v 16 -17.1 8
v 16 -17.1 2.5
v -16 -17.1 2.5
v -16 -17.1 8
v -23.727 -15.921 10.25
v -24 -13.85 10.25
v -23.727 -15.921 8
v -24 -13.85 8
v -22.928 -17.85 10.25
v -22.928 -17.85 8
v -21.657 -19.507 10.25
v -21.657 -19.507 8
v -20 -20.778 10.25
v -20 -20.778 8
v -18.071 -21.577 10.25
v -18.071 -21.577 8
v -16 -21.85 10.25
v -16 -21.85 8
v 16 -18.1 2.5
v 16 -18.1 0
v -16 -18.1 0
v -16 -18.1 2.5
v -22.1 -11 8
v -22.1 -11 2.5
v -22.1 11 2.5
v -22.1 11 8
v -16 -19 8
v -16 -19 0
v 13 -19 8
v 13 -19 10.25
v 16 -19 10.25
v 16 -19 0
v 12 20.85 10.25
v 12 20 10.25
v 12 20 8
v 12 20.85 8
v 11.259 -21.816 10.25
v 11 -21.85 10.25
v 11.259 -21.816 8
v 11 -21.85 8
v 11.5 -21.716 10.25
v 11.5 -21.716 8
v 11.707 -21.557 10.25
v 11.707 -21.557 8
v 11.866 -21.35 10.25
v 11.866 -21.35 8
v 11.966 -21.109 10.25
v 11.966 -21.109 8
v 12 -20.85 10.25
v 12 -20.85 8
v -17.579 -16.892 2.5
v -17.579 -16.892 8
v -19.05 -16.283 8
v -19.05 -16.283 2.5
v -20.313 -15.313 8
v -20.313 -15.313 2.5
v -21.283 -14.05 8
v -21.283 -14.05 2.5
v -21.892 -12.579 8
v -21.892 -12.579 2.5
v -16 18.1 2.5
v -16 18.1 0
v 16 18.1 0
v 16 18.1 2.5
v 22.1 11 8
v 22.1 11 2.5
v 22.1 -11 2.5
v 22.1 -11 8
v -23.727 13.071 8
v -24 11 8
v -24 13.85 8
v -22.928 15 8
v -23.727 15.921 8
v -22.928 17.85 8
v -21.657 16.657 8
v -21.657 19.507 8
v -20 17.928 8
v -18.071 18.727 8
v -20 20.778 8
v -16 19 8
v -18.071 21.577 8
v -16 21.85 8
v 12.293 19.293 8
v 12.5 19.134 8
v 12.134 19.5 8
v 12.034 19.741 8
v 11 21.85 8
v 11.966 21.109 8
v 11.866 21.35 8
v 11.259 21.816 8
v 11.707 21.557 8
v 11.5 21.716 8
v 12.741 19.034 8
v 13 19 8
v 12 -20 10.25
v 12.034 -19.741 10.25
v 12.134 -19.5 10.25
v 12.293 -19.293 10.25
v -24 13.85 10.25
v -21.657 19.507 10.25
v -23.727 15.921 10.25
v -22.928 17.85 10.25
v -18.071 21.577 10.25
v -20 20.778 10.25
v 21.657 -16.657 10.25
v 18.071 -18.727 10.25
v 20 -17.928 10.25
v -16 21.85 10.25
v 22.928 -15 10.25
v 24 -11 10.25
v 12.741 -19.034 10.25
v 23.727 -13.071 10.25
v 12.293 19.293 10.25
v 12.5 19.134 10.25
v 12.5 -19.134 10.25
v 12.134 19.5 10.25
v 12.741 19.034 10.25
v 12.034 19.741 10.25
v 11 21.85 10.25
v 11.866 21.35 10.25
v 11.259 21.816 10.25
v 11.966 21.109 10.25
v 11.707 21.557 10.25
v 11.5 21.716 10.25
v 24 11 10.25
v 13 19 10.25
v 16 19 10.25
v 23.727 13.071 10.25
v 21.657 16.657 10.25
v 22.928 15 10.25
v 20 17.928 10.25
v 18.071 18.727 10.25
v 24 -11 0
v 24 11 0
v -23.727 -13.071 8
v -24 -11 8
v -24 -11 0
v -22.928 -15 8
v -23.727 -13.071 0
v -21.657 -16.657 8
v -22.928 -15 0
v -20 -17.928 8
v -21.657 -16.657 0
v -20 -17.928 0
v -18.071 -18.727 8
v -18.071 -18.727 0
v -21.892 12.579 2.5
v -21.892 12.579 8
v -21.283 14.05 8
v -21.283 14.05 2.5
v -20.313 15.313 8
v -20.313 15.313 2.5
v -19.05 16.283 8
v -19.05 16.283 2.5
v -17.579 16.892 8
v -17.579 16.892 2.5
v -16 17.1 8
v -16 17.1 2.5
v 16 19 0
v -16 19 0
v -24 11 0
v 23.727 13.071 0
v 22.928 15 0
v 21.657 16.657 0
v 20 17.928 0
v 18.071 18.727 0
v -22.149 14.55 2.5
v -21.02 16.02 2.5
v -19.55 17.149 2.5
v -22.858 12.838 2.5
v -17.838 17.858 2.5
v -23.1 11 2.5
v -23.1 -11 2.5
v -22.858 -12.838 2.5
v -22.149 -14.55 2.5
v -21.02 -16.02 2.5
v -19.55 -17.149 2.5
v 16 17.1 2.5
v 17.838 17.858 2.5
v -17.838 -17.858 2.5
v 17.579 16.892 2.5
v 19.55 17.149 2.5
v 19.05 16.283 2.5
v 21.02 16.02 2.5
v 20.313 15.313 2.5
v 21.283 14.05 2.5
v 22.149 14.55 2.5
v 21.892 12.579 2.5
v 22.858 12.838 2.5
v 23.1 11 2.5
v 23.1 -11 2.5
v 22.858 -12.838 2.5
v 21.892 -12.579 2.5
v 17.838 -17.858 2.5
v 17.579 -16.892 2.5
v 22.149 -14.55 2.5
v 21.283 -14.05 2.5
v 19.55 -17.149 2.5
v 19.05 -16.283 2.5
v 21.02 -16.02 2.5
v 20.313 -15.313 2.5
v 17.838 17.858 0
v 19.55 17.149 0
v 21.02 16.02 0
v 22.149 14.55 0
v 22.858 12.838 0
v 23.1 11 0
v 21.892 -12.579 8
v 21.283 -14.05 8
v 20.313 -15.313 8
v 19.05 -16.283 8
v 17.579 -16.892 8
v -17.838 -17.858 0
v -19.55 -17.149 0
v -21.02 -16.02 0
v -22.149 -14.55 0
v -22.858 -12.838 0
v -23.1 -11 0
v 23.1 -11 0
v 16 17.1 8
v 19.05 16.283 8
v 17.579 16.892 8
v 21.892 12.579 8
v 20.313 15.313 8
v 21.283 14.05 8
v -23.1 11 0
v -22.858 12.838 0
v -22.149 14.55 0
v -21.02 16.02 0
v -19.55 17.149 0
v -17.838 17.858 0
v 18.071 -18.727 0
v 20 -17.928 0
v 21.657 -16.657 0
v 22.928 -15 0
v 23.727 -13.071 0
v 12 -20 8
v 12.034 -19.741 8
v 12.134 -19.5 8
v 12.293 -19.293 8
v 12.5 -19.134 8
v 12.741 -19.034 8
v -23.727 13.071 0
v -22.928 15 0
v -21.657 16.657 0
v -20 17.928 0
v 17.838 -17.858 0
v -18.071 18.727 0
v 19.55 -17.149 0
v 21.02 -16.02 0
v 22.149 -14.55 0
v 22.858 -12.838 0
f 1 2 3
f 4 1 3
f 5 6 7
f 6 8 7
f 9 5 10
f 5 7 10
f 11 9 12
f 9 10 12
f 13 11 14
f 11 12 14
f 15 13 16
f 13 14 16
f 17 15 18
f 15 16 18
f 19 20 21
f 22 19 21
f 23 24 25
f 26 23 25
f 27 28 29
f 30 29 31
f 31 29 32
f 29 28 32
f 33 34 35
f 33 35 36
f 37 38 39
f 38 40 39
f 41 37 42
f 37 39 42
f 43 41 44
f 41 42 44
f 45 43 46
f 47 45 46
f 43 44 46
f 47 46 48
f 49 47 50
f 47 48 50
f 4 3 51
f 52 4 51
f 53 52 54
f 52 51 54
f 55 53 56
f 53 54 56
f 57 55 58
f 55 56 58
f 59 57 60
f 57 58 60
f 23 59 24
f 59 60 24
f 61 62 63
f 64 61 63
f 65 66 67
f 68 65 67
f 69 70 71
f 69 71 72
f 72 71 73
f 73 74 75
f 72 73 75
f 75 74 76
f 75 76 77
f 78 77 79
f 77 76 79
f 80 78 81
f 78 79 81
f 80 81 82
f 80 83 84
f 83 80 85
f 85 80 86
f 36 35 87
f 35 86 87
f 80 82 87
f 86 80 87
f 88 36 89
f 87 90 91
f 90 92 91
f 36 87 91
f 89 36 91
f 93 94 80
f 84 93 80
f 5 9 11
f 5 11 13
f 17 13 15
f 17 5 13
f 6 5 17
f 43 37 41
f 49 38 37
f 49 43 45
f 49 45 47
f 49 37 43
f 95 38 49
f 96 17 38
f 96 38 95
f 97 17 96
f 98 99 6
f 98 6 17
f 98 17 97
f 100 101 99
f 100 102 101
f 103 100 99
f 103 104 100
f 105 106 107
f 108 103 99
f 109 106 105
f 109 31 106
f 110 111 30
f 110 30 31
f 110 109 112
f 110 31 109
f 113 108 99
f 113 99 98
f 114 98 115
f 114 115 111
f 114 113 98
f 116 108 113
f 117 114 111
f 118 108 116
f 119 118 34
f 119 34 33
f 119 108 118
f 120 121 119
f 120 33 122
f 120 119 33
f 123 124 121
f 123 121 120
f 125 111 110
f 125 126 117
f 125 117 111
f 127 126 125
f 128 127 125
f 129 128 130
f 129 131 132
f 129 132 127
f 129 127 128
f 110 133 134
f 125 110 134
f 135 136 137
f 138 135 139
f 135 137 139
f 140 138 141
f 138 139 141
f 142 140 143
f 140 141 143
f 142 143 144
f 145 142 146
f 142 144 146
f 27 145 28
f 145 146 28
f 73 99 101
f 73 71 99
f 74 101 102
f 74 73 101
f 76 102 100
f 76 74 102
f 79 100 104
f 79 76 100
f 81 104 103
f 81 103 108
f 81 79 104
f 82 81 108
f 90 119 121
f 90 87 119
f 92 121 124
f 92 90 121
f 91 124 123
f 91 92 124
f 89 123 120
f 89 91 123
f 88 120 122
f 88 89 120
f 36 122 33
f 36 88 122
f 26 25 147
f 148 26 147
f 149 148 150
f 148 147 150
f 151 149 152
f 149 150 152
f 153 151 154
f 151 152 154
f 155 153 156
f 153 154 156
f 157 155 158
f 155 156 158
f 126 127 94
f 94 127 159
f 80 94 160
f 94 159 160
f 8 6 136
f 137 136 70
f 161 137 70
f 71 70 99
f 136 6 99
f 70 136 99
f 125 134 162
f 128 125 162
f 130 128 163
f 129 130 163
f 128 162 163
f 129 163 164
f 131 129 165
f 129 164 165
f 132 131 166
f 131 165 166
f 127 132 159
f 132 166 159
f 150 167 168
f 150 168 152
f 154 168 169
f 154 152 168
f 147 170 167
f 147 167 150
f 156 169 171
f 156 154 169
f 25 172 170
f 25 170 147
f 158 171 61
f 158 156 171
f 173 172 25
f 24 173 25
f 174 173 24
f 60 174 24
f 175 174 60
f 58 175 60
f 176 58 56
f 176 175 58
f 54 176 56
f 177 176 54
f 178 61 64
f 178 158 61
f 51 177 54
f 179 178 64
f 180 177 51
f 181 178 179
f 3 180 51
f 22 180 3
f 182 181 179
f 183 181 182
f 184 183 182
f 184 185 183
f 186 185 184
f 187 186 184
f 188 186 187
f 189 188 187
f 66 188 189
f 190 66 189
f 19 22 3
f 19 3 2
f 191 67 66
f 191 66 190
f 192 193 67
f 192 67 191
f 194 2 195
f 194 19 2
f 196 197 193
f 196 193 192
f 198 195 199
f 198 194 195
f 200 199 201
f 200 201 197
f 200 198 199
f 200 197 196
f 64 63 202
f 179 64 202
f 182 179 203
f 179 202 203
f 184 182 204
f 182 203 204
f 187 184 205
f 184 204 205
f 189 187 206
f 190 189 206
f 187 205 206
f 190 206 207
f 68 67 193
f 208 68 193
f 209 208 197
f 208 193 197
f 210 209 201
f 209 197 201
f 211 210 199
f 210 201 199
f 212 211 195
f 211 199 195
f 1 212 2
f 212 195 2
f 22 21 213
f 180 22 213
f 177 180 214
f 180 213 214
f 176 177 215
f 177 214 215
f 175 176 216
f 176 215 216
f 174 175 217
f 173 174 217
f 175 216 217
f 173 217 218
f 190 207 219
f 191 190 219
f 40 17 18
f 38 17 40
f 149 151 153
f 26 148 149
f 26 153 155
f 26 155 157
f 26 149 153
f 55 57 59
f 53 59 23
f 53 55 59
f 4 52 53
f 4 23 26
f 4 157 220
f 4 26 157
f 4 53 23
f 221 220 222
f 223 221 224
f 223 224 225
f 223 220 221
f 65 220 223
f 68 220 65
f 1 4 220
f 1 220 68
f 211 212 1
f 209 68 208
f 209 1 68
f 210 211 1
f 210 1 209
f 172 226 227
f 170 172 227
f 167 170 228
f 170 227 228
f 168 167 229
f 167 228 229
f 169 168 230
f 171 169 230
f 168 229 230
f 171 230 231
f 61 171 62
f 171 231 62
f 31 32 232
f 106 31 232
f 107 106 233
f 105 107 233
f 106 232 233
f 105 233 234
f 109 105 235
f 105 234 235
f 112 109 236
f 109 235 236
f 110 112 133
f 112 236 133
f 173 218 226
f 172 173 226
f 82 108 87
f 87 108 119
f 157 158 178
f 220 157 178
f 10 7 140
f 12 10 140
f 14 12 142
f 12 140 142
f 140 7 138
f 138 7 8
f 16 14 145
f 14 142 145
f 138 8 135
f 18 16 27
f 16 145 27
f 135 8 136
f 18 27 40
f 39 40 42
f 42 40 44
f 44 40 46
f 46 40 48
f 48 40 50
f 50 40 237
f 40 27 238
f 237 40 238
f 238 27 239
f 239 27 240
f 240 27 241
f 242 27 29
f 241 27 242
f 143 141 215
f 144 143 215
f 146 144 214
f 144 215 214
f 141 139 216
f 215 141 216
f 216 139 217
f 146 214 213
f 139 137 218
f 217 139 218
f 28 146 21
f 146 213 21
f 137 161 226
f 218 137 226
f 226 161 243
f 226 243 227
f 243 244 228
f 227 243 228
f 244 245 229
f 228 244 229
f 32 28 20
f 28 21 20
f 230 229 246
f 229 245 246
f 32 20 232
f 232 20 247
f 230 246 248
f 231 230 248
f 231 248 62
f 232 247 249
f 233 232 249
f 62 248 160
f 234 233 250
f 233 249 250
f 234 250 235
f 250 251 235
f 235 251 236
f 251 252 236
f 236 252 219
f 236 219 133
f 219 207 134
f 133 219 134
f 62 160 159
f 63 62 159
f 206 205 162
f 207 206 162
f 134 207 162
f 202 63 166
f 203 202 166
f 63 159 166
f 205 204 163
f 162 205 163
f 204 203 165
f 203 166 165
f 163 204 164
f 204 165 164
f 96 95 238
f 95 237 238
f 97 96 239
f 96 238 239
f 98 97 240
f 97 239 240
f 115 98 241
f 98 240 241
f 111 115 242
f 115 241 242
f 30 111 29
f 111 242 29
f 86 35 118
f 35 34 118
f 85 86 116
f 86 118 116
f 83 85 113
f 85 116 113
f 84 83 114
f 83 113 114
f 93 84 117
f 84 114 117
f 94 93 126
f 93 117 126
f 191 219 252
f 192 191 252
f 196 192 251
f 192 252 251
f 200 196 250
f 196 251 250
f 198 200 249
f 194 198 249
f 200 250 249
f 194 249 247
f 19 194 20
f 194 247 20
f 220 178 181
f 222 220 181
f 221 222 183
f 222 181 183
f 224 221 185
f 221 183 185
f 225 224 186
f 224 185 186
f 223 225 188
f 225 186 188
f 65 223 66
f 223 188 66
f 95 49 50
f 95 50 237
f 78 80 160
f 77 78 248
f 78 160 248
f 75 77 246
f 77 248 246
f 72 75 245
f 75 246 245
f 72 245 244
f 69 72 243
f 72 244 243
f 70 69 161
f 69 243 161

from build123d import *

# Parameters (mm, degrees)
F1_DEPTH = 10.25
F2_W     = 36
F2_H     = 43.7
F3_DEPTH = 2.25
F4_R     = 8
F5_R     = 1
F6_R     = 1
F8_DEPTH = 8
F9_DEPTH = 2.5


with BuildPart() as f1:
    # F0 (on Top) → F1 (new body)
    with BuildSketch(Plane.XY):
        with BuildLine():
            Line((16, 19), (-16, 19))
            ThreePointArc((-16, 19), (-21.6568542495, 16.6568542495), (-24, 11))
            Line((-24, 11), (-24, -11))
            ThreePointArc((-24, -11), (-21.6568542495, -16.6568542495), (-16, -19))
            Line((-16, -19), (16, -19))
            ThreePointArc((16, -19), (21.6568542495, -16.6568542495), (24, -11))
            Line((24, -11), (24, 11))
            ThreePointArc((24, 11), (21.6568542495, 16.6568542495), (16, 19))
        make_face()
    extrude(amount=F1_DEPTH)

    # F2 (on face) → F3 (join)
    with BuildSketch(Plane.XY.offset(10.25)):
        with Locations((-6, 0)):
            Rectangle(F2_W, F2_H)
    extrude(amount=-F3_DEPTH)

    # F4
    f4_edges = [f1.edges().sort_by_distance(p)[0] for p in [
        (-24, -21.85, 9.125),
        (-24, 21.85, 9.125),
    ]]
    fillet(f4_edges, radius=F4_R)

    # F5
    f5_edges = [f1.edges().sort_by_distance(p)[0] for p in [
        (12, -21.85, 9.125),
        (12, 21.85, 9.125),
    ]]
    fillet(f5_edges, radius=F5_R)

    # F6
    f6_edges = [f1.edges().sort_by_distance(p)[0] for p in [
        (12, 19, 9.125),
        (12, -19, 9.125),
    ]]
    fillet(f6_edges, radius=F6_R)

    # F7 (on face) → F8 (cut)
    with BuildSketch(Plane(origin=(0, 0, 0), x_dir=(1, 0, 0), z_dir=(0, 0, -1))):
        with BuildLine():
            ThreePointArc((22.1, 11), (20.3133513652, 15.3133513652), (16, 17.1))
            Line((16, 17.1), (-16, 17.1))
            ThreePointArc((-16, 17.1), (-20.3133513652, 15.3133513652), (-22.1, 11))
            Line((-22.1, 11), (-22.1, -11))
            ThreePointArc((-22.1, -11), (-20.3133513652, -15.3133513652), (-16, -17.1))
            Line((-16, -17.1), (16, -17.1))
            ThreePointArc((16, -17.1), (20.3133513652, -15.3133513652), (22.1, -11))
            Line((22.1, -11), (22.1, 11))
        make_face()
    extrude(amount=-F8_DEPTH, mode=Mode.SUBTRACT)

    # F7 (on face) → F9 (cut)
    with BuildSketch(Plane(origin=(0, 0, 0), x_dir=(1, 0, 0), z_dir=(0, 0, -1))):
        with BuildLine():
            Line((23.1, -11), (23.1, 11))
            ThreePointArc((23.1, 11), (21.0204581464, 16.0204581464), (16, 18.1))
            Line((16, 18.1), (-16, 18.1))
            ThreePointArc((-16, 18.1), (-21.0204581464, 16.0204581464), (-23.1, 11))
            Line((-23.1, 11), (-23.1, -11))
            ThreePointArc((-23.1, -11), (-21.0204581464, -16.0204581464), (-16, -18.1))
            Line((-16, -18.1), (16, -18.1))
            ThreePointArc((16, -18.1), (21.0204581464, -16.0204581464), (23.1, -11))
        make_face()
        with BuildLine():
            Line((-16, 17.1), (16, 17.1))
            ThreePointArc((16, 17.1), (20.3133513652, 15.3133513652), (22.1, 11))
            Line((22.1, 11), (22.1, -11))
            ThreePointArc((22.1, -11), (20.3133513652, -15.3133513652), (16, -17.1))
            Line((16, -17.1), (-16, -17.1))
            ThreePointArc((-16, -17.1), (-20.3133513652, -15.3133513652), (-22.1, -11))
            Line((-22.1, -11), (-22.1, 11))
            ThreePointArc((-22.1, 11), (-20.3133513652, 15.3133513652), (-16, 17.1))
        make_face(mode=Mode.SUBTRACT)
    extrude(amount=-F9_DEPTH, mode=Mode.SUBTRACT)


solid = f1.part
